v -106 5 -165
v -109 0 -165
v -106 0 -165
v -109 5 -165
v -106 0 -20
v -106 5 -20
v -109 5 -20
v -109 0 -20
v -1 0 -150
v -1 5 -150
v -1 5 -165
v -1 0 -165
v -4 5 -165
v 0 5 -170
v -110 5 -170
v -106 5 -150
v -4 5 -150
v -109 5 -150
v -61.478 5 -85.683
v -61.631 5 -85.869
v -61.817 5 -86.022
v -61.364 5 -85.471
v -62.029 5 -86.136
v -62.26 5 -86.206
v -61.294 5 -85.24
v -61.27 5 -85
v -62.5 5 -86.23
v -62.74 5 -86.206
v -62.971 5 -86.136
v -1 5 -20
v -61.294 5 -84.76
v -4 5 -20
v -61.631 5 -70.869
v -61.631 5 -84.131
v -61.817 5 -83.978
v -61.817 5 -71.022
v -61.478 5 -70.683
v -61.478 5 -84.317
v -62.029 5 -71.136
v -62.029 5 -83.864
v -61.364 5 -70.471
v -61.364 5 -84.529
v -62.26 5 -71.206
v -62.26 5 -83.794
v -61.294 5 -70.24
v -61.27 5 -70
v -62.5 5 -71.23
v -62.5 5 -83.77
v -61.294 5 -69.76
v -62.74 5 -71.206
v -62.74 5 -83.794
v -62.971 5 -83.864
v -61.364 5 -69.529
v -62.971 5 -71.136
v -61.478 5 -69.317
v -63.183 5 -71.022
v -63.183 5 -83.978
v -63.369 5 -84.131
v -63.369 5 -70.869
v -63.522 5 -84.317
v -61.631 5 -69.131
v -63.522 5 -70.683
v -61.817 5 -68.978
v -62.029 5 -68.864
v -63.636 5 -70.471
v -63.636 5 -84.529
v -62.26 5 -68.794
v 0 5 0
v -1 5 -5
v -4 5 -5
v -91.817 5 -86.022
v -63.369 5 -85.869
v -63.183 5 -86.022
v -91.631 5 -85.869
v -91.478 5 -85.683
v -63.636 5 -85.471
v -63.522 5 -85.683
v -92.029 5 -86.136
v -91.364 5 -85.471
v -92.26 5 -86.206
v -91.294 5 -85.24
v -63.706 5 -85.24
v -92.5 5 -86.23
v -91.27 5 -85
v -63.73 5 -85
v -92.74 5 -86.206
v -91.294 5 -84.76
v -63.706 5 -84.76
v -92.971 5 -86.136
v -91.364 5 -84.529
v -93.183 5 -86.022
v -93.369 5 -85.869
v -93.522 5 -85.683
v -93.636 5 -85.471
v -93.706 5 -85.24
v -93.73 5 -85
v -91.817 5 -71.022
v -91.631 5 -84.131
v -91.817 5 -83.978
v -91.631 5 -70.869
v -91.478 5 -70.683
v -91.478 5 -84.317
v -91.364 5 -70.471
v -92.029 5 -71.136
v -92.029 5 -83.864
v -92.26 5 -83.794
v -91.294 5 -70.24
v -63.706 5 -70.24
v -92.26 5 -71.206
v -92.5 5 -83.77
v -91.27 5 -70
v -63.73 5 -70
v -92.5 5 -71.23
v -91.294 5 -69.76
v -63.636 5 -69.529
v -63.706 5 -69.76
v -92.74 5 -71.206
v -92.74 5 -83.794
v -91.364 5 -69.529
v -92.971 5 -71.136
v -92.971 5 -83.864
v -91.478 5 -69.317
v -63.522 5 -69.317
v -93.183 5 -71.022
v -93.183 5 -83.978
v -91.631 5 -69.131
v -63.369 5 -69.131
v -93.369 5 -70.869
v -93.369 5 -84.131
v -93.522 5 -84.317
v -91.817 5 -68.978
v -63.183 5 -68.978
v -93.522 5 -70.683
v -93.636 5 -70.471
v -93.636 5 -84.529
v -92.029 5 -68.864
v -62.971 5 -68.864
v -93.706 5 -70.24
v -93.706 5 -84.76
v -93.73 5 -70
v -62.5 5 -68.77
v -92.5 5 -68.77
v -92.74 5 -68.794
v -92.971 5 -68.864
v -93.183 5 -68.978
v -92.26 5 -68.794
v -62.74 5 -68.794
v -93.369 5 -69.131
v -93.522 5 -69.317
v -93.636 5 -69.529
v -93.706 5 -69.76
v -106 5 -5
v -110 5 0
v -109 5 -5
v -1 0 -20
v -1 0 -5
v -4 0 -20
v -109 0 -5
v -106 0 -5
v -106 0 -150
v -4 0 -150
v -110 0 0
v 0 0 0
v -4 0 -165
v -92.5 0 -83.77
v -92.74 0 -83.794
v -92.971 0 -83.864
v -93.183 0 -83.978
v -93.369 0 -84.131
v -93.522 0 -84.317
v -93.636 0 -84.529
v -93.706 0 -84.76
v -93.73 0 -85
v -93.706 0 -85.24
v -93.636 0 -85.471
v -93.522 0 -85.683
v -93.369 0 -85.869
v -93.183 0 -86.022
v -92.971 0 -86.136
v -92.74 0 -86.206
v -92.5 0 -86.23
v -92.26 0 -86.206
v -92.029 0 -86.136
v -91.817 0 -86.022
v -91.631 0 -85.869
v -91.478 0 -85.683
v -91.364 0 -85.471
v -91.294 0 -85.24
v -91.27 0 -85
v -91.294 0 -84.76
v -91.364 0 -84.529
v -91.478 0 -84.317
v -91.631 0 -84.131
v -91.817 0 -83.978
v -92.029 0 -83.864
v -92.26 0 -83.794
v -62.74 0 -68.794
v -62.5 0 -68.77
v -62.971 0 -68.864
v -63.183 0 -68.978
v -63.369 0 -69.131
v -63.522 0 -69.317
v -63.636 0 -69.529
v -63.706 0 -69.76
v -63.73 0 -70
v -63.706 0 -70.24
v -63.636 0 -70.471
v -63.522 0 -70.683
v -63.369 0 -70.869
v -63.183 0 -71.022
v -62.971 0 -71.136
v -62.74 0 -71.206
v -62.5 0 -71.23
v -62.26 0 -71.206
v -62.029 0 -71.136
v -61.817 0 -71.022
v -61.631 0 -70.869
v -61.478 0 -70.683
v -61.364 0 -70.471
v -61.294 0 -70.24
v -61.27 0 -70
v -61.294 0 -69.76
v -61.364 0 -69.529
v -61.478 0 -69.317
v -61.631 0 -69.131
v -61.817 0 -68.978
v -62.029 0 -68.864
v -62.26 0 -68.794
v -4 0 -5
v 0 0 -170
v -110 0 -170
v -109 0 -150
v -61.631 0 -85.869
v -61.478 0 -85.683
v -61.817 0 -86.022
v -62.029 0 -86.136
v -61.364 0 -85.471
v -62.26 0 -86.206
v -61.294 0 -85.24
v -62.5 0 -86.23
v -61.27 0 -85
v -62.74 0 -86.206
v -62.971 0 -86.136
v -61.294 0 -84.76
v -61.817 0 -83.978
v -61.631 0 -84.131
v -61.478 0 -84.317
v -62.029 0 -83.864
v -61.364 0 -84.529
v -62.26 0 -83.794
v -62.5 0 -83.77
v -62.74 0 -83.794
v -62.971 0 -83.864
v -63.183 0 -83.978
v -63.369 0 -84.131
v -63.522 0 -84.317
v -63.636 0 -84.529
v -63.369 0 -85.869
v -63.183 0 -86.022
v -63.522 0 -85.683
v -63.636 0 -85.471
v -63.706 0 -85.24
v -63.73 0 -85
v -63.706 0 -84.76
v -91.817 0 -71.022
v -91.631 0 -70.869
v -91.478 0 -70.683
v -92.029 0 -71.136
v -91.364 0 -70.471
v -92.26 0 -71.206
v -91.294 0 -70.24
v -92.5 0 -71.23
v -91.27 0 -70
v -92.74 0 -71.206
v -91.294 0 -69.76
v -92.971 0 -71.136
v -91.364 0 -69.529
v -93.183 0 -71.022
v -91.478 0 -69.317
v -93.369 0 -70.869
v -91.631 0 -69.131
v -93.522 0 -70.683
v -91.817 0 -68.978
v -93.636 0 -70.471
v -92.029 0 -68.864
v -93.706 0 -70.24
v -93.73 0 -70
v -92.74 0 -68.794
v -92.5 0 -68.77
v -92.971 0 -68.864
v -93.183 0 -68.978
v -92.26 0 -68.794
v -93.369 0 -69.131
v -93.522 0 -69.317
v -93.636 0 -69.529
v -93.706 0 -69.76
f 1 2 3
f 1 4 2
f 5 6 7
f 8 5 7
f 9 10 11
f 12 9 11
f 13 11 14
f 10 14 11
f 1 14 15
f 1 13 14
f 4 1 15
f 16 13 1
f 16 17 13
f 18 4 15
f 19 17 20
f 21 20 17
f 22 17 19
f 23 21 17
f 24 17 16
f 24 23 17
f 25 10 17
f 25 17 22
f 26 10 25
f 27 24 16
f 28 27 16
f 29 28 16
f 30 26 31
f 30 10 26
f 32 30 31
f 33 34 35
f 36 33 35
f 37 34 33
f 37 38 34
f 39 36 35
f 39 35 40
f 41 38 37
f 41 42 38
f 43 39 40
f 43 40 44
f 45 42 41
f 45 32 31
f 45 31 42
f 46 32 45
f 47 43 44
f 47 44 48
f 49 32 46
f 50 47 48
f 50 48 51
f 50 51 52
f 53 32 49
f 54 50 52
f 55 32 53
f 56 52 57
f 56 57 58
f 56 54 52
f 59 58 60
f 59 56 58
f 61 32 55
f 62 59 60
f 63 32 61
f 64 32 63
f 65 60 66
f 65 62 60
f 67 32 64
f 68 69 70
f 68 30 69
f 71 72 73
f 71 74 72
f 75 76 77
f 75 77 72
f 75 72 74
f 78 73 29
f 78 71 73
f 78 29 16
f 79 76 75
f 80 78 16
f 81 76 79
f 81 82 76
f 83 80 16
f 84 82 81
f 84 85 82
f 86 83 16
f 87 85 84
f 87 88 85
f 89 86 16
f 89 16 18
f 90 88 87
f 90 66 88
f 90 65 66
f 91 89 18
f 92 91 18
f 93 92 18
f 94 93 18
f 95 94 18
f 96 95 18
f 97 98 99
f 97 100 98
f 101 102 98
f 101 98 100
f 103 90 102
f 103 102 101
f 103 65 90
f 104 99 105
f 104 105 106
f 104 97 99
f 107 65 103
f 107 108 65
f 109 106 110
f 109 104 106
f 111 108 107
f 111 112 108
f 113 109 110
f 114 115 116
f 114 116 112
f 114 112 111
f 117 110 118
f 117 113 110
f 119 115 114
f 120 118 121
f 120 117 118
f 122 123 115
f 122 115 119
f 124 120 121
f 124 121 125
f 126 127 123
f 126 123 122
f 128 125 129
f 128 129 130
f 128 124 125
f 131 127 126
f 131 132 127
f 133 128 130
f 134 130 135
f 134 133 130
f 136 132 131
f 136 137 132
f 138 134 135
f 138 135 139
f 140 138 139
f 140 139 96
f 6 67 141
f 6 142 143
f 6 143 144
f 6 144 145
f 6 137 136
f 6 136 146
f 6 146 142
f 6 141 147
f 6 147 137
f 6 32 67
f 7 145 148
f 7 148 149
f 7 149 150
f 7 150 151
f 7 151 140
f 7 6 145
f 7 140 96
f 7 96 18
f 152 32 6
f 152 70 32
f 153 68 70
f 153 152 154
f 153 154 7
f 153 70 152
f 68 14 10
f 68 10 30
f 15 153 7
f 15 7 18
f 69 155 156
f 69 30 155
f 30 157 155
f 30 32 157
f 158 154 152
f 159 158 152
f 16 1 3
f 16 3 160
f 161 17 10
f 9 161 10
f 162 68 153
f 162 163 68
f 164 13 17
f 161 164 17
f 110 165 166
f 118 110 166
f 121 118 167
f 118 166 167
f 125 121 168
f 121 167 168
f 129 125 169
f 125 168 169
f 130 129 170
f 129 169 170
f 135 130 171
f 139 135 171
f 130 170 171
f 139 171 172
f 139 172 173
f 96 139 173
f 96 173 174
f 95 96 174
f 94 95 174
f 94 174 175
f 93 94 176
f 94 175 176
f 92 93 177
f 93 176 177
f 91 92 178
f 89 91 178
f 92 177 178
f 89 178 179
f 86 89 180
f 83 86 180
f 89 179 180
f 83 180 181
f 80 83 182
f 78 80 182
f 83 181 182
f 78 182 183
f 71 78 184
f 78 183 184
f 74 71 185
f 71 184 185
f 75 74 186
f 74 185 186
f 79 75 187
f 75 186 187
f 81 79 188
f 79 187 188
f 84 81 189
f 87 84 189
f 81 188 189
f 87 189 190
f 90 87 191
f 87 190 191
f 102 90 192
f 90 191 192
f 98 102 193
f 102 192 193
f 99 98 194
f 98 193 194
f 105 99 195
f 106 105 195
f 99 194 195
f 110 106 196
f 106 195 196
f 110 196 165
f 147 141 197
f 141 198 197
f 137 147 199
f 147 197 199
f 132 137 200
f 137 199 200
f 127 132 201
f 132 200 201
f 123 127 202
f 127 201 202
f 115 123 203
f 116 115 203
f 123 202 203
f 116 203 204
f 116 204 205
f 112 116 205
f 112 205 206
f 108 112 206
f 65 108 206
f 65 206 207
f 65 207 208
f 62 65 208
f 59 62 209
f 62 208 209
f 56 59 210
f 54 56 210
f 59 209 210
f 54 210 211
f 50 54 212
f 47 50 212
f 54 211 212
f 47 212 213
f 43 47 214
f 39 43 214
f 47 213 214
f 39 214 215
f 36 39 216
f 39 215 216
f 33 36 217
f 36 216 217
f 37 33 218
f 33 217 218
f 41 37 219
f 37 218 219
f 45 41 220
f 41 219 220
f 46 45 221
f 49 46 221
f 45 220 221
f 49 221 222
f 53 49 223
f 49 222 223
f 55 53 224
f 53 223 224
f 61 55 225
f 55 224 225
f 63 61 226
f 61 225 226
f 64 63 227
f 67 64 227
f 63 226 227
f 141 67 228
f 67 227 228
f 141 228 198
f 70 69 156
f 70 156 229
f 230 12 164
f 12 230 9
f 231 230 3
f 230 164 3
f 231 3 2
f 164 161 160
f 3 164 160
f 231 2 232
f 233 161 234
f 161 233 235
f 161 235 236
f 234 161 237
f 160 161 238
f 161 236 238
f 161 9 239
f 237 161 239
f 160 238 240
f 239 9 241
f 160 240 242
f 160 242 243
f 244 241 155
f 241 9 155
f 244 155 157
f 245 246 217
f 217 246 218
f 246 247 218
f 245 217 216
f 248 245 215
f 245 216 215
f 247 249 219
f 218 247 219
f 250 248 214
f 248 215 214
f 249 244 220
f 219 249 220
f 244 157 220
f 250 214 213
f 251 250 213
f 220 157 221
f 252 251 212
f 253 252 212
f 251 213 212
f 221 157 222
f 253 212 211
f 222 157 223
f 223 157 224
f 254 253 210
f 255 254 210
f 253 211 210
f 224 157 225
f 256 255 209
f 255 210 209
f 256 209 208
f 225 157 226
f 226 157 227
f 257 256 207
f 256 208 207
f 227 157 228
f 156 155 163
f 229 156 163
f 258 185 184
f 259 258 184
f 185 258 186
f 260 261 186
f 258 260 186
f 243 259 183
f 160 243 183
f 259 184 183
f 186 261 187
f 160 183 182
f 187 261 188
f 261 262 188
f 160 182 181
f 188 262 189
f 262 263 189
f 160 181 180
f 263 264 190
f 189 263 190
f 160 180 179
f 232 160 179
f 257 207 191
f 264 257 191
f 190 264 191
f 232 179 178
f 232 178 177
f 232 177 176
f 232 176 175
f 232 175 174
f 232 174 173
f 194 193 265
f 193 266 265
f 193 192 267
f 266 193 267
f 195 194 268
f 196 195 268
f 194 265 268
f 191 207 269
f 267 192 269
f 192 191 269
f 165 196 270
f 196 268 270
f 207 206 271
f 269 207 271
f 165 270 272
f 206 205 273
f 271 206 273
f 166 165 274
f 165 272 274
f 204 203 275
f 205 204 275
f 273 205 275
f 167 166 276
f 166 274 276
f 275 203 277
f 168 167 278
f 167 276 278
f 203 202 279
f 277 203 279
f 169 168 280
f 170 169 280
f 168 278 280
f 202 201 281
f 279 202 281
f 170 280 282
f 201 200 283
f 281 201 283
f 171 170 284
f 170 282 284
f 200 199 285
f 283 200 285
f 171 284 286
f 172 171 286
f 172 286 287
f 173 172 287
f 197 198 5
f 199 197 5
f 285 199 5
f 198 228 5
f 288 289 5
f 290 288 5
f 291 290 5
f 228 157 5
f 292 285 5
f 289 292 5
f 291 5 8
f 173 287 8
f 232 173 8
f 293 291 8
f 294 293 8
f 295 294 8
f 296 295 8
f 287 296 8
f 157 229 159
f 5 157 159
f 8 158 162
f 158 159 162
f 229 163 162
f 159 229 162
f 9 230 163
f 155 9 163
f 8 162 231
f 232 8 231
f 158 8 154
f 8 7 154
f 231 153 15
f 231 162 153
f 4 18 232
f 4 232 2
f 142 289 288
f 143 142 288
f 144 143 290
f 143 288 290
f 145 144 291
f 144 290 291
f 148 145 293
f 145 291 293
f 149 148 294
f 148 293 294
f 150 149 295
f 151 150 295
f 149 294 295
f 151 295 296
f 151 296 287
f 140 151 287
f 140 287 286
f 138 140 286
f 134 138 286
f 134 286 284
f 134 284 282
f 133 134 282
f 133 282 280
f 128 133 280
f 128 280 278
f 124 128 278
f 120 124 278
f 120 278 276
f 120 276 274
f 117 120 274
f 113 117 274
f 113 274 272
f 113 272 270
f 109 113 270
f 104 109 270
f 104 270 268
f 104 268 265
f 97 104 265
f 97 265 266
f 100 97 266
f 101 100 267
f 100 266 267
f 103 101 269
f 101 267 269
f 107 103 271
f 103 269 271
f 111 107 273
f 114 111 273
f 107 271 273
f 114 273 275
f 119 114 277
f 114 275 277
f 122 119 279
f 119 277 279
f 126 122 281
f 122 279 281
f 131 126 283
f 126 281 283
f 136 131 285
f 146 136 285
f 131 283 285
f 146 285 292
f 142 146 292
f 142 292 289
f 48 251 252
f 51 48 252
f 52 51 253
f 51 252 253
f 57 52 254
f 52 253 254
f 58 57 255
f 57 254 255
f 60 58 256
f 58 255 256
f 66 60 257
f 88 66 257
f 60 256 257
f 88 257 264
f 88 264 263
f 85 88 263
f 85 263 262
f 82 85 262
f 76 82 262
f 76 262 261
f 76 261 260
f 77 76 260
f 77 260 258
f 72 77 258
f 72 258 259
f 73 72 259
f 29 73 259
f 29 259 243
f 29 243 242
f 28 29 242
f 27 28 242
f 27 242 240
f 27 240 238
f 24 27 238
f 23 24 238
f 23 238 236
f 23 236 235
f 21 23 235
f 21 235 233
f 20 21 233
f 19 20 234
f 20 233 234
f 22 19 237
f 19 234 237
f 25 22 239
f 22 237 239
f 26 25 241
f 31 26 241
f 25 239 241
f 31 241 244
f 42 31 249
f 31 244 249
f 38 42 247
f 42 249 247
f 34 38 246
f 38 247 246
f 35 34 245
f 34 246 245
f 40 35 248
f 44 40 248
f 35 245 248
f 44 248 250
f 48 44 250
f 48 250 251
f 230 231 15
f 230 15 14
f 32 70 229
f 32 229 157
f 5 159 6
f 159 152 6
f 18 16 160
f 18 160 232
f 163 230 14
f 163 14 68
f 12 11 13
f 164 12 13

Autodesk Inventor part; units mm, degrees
ref_plane "YZ Plane" through (0, 0, 0) normal (1, 0, 0) x (0, 1, 0)
ref_plane "XZ Plane" through (0, 0, 0) normal (0, 1, 0) x (-1, 0, 0)
ref_plane "XY Plane" through (0, 0, 0) normal (0, 0, 1) x (1, 0, 0)
sketch "Esquisse1" plane through (0, 0, 0) normal (0, 1, 0) x (-1, 0, 0)
  line L0 (0, 0) -> (110, 0)
  line L1 (110, 0) -> (110, -170)
  line L2 (110, -170) -> (0, -170)
  line L3 (0, -170) -> (0, 0)
  dimension "d0" = 110
  dimension "d1" = 170
extrude "Extrusion1" add sketch "Esquisse1" along normal blind 5
sketch "Esquisse2" plane through (0, 5, 0) normal (0, 1, 0) x (1, 0, 0)
  line L0 (-110, 0) -> (0, 0) projected
  line L1 (-110, 0) -> (-110, 5)
  line L2 (-110, 170) -> (-110, 0) projected
  line L3 (-110, 5) -> (-105, 5)
  line L4 (-105, 5) -> (-106, 5)
  line L5 (-106, 5) -> (-106, 20)
  line L6 (-106, 20) -> (-109, 20)
  line L7 (-109, 20) -> (-109, 5)
  line L8 (-55, 0) -> (-55, 170)
  line L9 (-55, 85) -> (-68.7933, 85)
  line L10 (0, 5) -> (-5, 5)
  line L11 (-4, 5) -> (-4, 20)
  line L12 (-4, 20) -> (-1, 20)
  line L13 (-1, 20) -> (-1, 5)
  line L14 (-110, 165) -> (-105, 165)
  line L15 (-106, 165) -> (-106, 150)
  line L16 (-106, 150) -> (-109, 150)
  line L17 (-109, 150) -> (-109, 165)
  line L18 (-4, 165) -> (-4, 150)
  line L19 (-1, 150) -> (-1, 165)
  line L20 (0, 165) -> (-5, 165)
  line L21 (-4, 150) -> (-1, 150)
  dimension "d4" = 5
  dimension "d5" = 5
  dimension "d6" = 1
  dimension "d7" = 15
  dimension "d8" = 3
  dimension "d9" = 90
  dimension "d10" = 13.7933
  dimension "d11" = 85
extrude "Extrusion2" cut sketch "Esquisse2" against normal blind 5
sketch "Esquisse3" plane through (0, 5, 0) normal (0, 1, 0) x (1, 0, 0)
  line L0 (-110, 0) -> (0, 0) projected
  line L1 (-110, 0) -> (-110, 70)
  line L2 (-110, 170) -> (-110, 0) projected
  line L3 (-110, 70) -> (-92.5, 70)
  line L4 (-92.5, 70) -> (-92.5, 85)
  line L5 (-92.5, 85) -> (-62.5, 85)
  line L6 (-62.5, 85) -> (-62.5, 70)
  dimension "d14" = 70
  dimension "d15" = 17.5
  dimension "d16" = 15
  dimension "d17" = 30
hole "Perçage1" at (-92.5, 5, -70) at (-92.5, 5, -85) at (-62.5, 5, -85) at (-62.5, 5, -70) direction (0, -1, 0) diameter 2.459 end through all thread size "M3x0.5" class "6H" standard "ISO Metric profile"
properties part number "châssis haut avant"
